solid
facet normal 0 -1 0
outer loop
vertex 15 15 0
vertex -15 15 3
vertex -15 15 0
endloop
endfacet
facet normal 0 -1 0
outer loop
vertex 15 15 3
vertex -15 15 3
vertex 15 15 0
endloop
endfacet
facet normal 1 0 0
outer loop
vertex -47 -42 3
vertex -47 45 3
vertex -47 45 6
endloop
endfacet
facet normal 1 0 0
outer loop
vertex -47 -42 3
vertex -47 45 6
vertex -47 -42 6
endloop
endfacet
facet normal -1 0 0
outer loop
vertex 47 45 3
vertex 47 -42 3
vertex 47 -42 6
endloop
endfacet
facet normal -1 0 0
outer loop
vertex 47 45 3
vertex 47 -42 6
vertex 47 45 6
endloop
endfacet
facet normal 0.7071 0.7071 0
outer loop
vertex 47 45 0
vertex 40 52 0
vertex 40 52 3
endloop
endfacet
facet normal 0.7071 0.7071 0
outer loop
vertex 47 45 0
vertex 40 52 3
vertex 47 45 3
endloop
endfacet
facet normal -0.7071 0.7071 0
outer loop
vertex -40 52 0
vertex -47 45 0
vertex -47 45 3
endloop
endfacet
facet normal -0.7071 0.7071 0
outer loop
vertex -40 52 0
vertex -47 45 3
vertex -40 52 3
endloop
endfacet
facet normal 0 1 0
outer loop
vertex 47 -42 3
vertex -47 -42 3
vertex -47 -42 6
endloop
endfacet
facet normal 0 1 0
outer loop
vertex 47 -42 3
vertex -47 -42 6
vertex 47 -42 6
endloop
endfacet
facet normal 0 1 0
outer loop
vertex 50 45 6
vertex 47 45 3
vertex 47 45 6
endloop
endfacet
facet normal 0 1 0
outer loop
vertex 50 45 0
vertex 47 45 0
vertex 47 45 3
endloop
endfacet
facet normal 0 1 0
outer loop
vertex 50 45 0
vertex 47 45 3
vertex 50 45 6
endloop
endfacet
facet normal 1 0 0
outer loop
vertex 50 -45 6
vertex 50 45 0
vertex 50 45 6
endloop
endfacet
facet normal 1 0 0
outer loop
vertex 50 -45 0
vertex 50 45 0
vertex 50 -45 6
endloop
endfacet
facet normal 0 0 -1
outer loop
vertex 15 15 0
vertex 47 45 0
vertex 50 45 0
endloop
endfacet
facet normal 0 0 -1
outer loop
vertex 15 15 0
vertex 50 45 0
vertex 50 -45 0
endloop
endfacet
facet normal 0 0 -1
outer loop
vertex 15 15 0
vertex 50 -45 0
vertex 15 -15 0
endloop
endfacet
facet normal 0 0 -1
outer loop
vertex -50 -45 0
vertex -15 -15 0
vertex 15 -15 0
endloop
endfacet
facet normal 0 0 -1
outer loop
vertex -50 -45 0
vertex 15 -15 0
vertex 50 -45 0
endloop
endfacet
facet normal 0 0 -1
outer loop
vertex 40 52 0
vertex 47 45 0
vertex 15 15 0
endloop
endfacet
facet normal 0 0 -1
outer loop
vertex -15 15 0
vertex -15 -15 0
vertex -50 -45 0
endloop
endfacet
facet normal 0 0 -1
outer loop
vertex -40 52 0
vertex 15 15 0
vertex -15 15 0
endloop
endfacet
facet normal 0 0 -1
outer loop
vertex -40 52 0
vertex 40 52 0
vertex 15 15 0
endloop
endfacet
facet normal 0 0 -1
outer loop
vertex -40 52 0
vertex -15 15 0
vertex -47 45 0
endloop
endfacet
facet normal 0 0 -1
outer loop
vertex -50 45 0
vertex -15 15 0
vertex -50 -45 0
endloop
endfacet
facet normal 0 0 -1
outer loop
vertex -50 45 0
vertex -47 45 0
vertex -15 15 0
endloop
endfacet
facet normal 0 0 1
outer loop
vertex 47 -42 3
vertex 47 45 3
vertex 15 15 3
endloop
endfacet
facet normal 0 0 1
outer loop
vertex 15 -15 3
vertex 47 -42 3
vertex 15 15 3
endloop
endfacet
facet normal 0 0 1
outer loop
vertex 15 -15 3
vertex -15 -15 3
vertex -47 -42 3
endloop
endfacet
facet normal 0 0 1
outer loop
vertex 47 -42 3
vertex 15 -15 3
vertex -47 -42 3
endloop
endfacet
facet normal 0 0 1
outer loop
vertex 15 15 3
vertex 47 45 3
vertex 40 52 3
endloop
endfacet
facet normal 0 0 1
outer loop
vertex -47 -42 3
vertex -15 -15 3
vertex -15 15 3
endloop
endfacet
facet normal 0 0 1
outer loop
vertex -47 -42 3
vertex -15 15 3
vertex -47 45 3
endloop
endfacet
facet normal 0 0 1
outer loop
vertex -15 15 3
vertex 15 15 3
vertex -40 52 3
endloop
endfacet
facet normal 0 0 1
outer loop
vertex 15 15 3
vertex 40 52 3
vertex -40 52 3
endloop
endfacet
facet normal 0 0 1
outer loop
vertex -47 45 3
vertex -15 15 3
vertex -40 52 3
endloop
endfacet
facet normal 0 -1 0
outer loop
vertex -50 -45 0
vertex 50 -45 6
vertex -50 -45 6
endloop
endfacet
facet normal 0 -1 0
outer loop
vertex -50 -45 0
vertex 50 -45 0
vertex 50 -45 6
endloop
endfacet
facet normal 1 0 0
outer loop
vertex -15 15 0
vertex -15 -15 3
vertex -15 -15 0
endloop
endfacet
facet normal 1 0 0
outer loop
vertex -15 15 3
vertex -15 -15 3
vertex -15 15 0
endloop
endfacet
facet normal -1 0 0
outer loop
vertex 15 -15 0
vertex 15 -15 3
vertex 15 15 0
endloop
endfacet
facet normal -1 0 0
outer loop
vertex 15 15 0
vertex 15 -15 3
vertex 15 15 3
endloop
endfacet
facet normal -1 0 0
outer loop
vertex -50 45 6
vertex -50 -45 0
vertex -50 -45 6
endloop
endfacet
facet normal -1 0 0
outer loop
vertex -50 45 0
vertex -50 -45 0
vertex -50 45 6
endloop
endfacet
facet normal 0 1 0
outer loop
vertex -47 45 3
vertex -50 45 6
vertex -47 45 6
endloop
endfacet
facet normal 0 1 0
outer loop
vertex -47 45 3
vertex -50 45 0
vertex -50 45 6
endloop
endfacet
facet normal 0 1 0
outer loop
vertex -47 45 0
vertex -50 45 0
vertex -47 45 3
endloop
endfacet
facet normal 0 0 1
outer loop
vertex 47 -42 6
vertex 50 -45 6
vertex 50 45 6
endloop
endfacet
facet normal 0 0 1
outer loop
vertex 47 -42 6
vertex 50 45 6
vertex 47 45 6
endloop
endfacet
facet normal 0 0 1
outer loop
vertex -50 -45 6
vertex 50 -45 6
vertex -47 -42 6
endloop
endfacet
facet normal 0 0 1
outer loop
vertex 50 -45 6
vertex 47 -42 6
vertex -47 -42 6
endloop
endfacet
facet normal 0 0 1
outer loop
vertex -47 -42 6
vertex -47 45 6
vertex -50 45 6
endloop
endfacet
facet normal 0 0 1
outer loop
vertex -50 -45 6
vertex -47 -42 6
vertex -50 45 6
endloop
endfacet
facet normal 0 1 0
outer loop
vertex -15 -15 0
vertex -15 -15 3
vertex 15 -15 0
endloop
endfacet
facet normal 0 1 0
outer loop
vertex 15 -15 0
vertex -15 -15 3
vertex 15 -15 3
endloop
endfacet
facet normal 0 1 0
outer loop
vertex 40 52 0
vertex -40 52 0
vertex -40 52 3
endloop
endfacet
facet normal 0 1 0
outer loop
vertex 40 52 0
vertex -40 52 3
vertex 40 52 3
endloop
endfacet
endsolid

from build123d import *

# Parameters (mm, degrees)
SALIENTE_EXTRUIR1_DEPTH = 3
CROQUIS3_W              = 30
CROQUIS3_H              = 30
CORTAR_EXTRUIR1_DEPTH   = 3
SALIENTE_EXTRUIR2_DEPTH = 3


with BuildPart() as part:
    # Croquis1 → Saliente-Extruir1 (new body)
    with BuildSketch(Plane.XY):
        Polygon((-50, 45), (-47, 45), (-40, 52), (40, 52), (47, 45), (50, 45), (50, -45), (-50, -45), align=None)
    extrude(amount=SALIENTE_EXTRUIR1_DEPTH)

    # Croquis3 → Cortar-Extruir1 (cut)
    with BuildSketch(Plane.XY.offset(3)):
        Rectangle(CROQUIS3_W, CROQUIS3_H)
    extrude(amount=-CORTAR_EXTRUIR1_DEPTH, mode=Mode.SUBTRACT)

    # Croquis4 → Saliente-Extruir2 (add)
    with BuildSketch(Plane.XY.offset(3)):
        Polygon((-50, 45), (-47, 45), (-47, -42), (47, -42), (47, 45), (50, 45), (50, -45), (-50, -45), align=None)
    extrude(amount=SALIENTE_EXTRUIR2_DEPTH)


solid = part.part
